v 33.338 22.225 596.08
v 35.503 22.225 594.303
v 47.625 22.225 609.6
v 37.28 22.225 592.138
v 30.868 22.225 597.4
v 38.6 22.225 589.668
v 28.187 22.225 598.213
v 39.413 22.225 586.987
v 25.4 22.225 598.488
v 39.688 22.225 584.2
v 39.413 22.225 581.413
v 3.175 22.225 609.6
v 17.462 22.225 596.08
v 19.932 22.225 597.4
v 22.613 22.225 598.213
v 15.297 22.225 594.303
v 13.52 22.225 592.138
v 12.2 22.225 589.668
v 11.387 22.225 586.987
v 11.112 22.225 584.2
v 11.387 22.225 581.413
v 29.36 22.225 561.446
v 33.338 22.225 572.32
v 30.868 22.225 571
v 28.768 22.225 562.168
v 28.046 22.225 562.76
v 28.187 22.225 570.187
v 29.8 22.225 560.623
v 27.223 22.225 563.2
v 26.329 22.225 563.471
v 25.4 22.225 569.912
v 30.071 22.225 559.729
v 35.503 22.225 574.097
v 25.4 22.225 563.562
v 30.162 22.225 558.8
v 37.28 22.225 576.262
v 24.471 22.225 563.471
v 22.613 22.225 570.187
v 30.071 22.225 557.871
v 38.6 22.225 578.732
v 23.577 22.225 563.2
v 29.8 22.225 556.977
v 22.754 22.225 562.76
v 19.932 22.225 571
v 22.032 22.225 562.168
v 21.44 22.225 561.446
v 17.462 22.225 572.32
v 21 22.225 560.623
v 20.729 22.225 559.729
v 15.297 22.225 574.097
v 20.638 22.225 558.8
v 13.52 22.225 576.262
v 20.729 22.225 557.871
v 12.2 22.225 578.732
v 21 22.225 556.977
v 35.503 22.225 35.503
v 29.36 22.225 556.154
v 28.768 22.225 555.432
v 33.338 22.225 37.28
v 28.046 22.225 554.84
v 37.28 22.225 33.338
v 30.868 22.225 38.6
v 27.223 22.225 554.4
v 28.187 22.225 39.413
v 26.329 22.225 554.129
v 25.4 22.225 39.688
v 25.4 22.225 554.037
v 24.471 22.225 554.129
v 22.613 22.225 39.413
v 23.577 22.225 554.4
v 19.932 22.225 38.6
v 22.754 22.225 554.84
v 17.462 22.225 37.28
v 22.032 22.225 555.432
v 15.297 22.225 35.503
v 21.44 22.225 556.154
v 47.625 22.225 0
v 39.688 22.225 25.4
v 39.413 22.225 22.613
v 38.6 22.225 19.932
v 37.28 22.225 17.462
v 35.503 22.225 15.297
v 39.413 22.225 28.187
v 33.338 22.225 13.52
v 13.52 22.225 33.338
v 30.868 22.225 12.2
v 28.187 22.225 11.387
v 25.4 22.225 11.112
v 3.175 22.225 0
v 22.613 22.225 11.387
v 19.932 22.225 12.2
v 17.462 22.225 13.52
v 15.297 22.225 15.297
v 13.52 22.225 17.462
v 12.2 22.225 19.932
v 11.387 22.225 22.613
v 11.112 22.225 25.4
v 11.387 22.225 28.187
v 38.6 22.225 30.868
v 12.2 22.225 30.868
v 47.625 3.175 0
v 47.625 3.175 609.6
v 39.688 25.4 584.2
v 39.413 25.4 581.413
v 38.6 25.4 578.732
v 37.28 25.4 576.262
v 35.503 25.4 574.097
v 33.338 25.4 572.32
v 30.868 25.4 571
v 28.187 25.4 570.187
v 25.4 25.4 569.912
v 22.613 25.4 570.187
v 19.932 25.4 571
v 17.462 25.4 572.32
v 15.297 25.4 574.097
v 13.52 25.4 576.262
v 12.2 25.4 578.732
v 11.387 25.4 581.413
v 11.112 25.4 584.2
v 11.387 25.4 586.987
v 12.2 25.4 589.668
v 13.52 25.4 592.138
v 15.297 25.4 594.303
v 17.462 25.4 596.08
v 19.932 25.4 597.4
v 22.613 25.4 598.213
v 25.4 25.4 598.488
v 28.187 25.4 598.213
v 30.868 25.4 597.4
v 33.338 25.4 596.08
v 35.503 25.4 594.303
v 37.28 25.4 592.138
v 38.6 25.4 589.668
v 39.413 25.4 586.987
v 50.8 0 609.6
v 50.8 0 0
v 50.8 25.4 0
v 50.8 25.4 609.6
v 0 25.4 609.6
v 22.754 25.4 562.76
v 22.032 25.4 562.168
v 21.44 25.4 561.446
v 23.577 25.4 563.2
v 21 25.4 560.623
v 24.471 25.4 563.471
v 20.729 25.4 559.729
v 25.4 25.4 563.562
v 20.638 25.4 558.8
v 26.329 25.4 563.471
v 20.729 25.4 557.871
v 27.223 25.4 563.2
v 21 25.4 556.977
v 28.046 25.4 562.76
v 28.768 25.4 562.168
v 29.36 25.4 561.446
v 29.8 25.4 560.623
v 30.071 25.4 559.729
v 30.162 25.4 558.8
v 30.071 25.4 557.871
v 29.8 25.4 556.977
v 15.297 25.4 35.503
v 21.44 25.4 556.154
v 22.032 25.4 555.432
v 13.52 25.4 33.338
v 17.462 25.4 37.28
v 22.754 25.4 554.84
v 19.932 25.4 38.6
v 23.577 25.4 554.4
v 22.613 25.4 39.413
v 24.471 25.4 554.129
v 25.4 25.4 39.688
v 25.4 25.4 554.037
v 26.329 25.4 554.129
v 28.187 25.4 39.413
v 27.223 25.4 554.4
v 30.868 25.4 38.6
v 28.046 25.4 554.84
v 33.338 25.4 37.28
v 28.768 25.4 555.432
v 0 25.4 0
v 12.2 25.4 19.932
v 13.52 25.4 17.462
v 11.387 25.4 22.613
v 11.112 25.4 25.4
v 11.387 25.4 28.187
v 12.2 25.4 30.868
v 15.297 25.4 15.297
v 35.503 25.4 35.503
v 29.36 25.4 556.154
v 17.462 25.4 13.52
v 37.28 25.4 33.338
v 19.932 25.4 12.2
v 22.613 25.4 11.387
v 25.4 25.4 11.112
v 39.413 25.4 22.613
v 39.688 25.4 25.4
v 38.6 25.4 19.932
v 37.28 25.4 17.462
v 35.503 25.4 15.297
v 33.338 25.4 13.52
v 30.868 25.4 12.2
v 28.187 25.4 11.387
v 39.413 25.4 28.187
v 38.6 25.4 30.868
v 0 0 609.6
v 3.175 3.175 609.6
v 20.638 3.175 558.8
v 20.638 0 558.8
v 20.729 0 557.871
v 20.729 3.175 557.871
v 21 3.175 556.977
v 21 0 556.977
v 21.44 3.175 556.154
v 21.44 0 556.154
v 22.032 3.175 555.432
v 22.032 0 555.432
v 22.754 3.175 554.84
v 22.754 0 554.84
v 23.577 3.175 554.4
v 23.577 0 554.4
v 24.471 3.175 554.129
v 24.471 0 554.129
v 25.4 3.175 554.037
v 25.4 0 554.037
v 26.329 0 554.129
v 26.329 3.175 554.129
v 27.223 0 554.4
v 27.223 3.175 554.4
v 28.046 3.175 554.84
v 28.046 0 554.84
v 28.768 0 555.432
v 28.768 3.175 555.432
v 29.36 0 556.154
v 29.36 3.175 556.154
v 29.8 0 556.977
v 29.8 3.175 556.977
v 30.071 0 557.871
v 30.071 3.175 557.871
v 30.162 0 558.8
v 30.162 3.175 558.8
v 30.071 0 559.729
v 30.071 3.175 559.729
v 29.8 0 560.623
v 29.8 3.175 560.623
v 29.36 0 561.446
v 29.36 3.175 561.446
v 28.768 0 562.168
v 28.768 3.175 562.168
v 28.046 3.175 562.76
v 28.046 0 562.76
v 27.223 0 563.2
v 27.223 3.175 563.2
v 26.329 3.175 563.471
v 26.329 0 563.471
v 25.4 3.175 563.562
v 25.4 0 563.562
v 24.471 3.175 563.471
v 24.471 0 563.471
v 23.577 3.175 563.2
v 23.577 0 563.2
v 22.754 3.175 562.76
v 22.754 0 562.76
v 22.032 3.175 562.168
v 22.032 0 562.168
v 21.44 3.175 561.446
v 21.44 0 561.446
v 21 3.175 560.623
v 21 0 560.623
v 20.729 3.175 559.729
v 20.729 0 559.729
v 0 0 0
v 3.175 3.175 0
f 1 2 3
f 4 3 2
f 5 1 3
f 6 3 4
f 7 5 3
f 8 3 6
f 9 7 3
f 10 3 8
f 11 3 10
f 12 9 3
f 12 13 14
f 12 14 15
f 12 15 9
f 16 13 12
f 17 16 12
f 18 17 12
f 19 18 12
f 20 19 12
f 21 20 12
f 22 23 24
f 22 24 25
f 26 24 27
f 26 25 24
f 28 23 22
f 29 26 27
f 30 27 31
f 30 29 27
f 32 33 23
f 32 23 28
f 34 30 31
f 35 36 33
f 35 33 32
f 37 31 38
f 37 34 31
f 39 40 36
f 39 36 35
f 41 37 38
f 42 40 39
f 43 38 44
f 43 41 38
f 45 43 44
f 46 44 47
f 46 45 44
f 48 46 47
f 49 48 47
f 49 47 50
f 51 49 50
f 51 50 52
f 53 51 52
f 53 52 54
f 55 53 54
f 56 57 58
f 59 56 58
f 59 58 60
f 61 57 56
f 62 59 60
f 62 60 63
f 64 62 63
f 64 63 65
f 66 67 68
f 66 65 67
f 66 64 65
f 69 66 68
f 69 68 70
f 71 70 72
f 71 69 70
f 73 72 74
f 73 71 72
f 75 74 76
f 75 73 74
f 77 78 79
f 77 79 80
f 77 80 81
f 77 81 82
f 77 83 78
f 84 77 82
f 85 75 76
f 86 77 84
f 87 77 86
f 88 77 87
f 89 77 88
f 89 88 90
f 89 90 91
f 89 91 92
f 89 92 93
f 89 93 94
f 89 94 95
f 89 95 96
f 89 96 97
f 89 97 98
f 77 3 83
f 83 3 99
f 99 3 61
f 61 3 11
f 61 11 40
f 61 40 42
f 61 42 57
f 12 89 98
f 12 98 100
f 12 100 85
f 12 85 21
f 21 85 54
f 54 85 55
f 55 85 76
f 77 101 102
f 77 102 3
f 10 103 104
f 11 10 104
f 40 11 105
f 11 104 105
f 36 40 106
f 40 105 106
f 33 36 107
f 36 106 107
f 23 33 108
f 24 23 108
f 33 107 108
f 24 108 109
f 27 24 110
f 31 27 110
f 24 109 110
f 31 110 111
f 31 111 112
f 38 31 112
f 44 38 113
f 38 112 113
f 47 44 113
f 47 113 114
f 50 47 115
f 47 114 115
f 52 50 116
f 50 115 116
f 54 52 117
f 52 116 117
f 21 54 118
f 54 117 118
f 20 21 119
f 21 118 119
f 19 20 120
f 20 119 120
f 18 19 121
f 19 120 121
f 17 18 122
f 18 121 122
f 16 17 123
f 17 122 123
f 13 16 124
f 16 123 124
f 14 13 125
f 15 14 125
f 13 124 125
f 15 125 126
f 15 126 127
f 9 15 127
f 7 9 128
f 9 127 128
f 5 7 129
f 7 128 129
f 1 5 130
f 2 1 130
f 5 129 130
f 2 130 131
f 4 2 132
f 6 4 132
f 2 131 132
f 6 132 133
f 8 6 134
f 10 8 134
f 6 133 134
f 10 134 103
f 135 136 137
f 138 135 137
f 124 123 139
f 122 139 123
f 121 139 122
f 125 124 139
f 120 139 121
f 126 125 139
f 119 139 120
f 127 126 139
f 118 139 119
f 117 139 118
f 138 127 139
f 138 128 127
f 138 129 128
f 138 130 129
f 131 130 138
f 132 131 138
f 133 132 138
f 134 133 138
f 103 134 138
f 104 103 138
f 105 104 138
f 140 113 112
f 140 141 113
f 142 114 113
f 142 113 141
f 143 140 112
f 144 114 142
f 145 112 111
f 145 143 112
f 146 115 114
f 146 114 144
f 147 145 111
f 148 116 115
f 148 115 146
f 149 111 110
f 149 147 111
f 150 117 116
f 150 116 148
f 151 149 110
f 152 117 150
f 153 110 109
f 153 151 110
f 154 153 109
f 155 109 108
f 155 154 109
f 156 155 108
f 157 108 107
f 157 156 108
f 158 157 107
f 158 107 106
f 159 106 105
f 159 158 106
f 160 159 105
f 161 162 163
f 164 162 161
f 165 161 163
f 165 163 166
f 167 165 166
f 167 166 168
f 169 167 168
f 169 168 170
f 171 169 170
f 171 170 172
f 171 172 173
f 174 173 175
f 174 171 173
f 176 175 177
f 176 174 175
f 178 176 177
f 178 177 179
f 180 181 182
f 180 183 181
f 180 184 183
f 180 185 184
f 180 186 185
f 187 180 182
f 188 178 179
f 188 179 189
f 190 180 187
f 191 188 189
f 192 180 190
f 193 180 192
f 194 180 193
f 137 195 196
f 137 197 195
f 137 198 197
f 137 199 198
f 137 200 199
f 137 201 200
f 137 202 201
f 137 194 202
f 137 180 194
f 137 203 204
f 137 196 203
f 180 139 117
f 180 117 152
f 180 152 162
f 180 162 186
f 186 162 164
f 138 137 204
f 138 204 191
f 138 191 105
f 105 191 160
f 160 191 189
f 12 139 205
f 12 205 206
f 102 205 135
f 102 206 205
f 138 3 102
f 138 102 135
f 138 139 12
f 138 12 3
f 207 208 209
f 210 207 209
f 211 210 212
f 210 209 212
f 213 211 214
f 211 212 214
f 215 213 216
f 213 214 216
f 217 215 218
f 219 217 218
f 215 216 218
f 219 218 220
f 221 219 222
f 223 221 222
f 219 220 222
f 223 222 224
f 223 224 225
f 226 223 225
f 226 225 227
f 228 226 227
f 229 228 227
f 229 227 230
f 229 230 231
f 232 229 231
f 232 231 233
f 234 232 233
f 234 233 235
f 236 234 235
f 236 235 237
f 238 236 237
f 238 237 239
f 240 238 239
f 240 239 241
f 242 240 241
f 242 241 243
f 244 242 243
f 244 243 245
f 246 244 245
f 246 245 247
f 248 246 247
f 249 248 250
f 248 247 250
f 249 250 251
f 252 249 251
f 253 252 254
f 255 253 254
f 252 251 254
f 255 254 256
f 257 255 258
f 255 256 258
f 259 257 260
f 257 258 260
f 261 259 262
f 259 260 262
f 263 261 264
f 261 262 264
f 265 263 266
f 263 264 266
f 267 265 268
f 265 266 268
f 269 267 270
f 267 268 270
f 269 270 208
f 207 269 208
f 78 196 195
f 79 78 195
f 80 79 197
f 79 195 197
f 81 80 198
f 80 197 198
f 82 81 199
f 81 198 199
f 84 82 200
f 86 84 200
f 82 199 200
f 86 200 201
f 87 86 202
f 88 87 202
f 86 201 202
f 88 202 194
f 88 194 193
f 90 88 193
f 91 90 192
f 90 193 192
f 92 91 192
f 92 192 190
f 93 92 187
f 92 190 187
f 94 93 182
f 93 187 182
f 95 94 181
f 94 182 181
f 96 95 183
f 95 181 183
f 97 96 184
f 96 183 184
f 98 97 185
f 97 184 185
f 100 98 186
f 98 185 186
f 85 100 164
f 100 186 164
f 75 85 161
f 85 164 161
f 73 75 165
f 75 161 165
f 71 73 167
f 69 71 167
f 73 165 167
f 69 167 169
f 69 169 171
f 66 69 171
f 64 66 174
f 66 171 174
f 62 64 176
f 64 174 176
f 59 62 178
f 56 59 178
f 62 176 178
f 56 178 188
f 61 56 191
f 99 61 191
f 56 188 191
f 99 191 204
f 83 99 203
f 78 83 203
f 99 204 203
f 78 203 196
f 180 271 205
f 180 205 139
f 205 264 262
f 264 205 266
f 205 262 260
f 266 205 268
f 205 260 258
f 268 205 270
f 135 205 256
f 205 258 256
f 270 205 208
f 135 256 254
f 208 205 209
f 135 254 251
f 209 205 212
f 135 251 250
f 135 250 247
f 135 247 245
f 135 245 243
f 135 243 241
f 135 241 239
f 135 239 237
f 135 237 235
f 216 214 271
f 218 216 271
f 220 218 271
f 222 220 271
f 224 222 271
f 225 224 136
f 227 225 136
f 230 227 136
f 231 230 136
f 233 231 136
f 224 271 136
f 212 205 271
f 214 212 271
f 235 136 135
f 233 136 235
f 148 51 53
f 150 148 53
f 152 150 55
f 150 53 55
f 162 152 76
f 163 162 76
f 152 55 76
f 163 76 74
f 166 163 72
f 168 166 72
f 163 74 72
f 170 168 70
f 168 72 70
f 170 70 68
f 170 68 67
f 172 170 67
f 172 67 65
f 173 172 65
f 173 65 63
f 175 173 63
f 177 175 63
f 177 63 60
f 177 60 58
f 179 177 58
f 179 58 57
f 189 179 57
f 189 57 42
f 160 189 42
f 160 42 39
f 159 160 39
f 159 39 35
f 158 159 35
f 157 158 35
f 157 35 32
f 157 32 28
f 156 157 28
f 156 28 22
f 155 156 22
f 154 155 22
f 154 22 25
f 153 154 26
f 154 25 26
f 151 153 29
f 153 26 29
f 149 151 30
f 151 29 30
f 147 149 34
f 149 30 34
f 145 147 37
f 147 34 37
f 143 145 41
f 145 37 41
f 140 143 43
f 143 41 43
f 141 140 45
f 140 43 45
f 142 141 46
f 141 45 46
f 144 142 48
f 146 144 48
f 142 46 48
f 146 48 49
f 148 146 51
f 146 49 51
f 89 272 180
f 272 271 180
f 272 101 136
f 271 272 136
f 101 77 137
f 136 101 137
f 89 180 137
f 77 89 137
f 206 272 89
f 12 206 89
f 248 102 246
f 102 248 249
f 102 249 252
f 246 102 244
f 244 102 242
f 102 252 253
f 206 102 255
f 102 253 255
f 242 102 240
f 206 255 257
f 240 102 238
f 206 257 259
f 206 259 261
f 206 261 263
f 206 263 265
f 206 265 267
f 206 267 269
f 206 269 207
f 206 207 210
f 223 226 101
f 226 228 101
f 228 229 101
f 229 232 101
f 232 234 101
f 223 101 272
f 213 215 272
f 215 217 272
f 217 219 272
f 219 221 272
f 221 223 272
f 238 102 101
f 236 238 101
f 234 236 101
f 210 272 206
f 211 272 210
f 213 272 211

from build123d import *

# Parameters (mm, degrees)
SKETCH1_W           = 50.8
SKETCH1_H           = 25.4
BOSS_EXTRUDE1_DEPTH = 609.6
SKETCH2_W           = 44.45
SKETCH2_H           = 19.05
CUT_EXTRUDE1_DEPTH  = 635
SKETCH6_R           = 14.2875
CUT_EXTRUDE5_DEPTH  = 3.175
SKETCH7_R           = 14.2875
CUT_EXTRUDE6_DEPTH  = 3.175
SKETCH8_R           = 4.7625
CUT_EXTRUDE7_DEPTH  = 25.4


with BuildPart() as part:
    # Sketch1 → Boss-Extrude1 (new body)
    with BuildSketch(Plane.XY):
        with Locations((25.4, 12.7)):
            Rectangle(SKETCH1_W, SKETCH1_H)
    extrude(amount=BOSS_EXTRUDE1_DEPTH)

    # Sketch2 → Cut-Extrude1 (cut)
    with BuildSketch(Plane(origin=(0, 0, 0), x_dir=(-1, 0, 0), z_dir=(0, 0, -1))):
        with Locations((-25.4, 12.7)):
            Rectangle(SKETCH2_W, SKETCH2_H)
    extrude(amount=-CUT_EXTRUDE1_DEPTH, mode=Mode.SUBTRACT)

    # Sketch6 → Cut-Extrude5 (cut)
    with BuildSketch(Plane(origin=(0, 25.4, 0), x_dir=(1, 0, 0), z_dir=(0, 1, 0))):
        with Locations((25.4, -25.4)):
            Circle(SKETCH6_R)
    extrude(amount=-CUT_EXTRUDE5_DEPTH, mode=Mode.SUBTRACT)

    # Sketch7 → Cut-Extrude6 (cut)
    with BuildSketch(Plane(origin=(0, 25.4, 0), x_dir=(1, 0, 0), z_dir=(0, 1, 0))):
        with Locations((25.4, -584.2)):
            Circle(SKETCH7_R)
    extrude(amount=-CUT_EXTRUDE6_DEPTH, mode=Mode.SUBTRACT)

    # Sketch8 → Cut-Extrude7 (cut)
    with BuildSketch(Plane(origin=(0, 0, 0), x_dir=(-1, 0, 0), z_dir=(0, -1, 0))):
        with Locations((-25.4, -558.8)):
            Circle(SKETCH8_R)
    extrude(amount=-CUT_EXTRUDE7_DEPTH, mode=Mode.SUBTRACT)


solid = part.part
